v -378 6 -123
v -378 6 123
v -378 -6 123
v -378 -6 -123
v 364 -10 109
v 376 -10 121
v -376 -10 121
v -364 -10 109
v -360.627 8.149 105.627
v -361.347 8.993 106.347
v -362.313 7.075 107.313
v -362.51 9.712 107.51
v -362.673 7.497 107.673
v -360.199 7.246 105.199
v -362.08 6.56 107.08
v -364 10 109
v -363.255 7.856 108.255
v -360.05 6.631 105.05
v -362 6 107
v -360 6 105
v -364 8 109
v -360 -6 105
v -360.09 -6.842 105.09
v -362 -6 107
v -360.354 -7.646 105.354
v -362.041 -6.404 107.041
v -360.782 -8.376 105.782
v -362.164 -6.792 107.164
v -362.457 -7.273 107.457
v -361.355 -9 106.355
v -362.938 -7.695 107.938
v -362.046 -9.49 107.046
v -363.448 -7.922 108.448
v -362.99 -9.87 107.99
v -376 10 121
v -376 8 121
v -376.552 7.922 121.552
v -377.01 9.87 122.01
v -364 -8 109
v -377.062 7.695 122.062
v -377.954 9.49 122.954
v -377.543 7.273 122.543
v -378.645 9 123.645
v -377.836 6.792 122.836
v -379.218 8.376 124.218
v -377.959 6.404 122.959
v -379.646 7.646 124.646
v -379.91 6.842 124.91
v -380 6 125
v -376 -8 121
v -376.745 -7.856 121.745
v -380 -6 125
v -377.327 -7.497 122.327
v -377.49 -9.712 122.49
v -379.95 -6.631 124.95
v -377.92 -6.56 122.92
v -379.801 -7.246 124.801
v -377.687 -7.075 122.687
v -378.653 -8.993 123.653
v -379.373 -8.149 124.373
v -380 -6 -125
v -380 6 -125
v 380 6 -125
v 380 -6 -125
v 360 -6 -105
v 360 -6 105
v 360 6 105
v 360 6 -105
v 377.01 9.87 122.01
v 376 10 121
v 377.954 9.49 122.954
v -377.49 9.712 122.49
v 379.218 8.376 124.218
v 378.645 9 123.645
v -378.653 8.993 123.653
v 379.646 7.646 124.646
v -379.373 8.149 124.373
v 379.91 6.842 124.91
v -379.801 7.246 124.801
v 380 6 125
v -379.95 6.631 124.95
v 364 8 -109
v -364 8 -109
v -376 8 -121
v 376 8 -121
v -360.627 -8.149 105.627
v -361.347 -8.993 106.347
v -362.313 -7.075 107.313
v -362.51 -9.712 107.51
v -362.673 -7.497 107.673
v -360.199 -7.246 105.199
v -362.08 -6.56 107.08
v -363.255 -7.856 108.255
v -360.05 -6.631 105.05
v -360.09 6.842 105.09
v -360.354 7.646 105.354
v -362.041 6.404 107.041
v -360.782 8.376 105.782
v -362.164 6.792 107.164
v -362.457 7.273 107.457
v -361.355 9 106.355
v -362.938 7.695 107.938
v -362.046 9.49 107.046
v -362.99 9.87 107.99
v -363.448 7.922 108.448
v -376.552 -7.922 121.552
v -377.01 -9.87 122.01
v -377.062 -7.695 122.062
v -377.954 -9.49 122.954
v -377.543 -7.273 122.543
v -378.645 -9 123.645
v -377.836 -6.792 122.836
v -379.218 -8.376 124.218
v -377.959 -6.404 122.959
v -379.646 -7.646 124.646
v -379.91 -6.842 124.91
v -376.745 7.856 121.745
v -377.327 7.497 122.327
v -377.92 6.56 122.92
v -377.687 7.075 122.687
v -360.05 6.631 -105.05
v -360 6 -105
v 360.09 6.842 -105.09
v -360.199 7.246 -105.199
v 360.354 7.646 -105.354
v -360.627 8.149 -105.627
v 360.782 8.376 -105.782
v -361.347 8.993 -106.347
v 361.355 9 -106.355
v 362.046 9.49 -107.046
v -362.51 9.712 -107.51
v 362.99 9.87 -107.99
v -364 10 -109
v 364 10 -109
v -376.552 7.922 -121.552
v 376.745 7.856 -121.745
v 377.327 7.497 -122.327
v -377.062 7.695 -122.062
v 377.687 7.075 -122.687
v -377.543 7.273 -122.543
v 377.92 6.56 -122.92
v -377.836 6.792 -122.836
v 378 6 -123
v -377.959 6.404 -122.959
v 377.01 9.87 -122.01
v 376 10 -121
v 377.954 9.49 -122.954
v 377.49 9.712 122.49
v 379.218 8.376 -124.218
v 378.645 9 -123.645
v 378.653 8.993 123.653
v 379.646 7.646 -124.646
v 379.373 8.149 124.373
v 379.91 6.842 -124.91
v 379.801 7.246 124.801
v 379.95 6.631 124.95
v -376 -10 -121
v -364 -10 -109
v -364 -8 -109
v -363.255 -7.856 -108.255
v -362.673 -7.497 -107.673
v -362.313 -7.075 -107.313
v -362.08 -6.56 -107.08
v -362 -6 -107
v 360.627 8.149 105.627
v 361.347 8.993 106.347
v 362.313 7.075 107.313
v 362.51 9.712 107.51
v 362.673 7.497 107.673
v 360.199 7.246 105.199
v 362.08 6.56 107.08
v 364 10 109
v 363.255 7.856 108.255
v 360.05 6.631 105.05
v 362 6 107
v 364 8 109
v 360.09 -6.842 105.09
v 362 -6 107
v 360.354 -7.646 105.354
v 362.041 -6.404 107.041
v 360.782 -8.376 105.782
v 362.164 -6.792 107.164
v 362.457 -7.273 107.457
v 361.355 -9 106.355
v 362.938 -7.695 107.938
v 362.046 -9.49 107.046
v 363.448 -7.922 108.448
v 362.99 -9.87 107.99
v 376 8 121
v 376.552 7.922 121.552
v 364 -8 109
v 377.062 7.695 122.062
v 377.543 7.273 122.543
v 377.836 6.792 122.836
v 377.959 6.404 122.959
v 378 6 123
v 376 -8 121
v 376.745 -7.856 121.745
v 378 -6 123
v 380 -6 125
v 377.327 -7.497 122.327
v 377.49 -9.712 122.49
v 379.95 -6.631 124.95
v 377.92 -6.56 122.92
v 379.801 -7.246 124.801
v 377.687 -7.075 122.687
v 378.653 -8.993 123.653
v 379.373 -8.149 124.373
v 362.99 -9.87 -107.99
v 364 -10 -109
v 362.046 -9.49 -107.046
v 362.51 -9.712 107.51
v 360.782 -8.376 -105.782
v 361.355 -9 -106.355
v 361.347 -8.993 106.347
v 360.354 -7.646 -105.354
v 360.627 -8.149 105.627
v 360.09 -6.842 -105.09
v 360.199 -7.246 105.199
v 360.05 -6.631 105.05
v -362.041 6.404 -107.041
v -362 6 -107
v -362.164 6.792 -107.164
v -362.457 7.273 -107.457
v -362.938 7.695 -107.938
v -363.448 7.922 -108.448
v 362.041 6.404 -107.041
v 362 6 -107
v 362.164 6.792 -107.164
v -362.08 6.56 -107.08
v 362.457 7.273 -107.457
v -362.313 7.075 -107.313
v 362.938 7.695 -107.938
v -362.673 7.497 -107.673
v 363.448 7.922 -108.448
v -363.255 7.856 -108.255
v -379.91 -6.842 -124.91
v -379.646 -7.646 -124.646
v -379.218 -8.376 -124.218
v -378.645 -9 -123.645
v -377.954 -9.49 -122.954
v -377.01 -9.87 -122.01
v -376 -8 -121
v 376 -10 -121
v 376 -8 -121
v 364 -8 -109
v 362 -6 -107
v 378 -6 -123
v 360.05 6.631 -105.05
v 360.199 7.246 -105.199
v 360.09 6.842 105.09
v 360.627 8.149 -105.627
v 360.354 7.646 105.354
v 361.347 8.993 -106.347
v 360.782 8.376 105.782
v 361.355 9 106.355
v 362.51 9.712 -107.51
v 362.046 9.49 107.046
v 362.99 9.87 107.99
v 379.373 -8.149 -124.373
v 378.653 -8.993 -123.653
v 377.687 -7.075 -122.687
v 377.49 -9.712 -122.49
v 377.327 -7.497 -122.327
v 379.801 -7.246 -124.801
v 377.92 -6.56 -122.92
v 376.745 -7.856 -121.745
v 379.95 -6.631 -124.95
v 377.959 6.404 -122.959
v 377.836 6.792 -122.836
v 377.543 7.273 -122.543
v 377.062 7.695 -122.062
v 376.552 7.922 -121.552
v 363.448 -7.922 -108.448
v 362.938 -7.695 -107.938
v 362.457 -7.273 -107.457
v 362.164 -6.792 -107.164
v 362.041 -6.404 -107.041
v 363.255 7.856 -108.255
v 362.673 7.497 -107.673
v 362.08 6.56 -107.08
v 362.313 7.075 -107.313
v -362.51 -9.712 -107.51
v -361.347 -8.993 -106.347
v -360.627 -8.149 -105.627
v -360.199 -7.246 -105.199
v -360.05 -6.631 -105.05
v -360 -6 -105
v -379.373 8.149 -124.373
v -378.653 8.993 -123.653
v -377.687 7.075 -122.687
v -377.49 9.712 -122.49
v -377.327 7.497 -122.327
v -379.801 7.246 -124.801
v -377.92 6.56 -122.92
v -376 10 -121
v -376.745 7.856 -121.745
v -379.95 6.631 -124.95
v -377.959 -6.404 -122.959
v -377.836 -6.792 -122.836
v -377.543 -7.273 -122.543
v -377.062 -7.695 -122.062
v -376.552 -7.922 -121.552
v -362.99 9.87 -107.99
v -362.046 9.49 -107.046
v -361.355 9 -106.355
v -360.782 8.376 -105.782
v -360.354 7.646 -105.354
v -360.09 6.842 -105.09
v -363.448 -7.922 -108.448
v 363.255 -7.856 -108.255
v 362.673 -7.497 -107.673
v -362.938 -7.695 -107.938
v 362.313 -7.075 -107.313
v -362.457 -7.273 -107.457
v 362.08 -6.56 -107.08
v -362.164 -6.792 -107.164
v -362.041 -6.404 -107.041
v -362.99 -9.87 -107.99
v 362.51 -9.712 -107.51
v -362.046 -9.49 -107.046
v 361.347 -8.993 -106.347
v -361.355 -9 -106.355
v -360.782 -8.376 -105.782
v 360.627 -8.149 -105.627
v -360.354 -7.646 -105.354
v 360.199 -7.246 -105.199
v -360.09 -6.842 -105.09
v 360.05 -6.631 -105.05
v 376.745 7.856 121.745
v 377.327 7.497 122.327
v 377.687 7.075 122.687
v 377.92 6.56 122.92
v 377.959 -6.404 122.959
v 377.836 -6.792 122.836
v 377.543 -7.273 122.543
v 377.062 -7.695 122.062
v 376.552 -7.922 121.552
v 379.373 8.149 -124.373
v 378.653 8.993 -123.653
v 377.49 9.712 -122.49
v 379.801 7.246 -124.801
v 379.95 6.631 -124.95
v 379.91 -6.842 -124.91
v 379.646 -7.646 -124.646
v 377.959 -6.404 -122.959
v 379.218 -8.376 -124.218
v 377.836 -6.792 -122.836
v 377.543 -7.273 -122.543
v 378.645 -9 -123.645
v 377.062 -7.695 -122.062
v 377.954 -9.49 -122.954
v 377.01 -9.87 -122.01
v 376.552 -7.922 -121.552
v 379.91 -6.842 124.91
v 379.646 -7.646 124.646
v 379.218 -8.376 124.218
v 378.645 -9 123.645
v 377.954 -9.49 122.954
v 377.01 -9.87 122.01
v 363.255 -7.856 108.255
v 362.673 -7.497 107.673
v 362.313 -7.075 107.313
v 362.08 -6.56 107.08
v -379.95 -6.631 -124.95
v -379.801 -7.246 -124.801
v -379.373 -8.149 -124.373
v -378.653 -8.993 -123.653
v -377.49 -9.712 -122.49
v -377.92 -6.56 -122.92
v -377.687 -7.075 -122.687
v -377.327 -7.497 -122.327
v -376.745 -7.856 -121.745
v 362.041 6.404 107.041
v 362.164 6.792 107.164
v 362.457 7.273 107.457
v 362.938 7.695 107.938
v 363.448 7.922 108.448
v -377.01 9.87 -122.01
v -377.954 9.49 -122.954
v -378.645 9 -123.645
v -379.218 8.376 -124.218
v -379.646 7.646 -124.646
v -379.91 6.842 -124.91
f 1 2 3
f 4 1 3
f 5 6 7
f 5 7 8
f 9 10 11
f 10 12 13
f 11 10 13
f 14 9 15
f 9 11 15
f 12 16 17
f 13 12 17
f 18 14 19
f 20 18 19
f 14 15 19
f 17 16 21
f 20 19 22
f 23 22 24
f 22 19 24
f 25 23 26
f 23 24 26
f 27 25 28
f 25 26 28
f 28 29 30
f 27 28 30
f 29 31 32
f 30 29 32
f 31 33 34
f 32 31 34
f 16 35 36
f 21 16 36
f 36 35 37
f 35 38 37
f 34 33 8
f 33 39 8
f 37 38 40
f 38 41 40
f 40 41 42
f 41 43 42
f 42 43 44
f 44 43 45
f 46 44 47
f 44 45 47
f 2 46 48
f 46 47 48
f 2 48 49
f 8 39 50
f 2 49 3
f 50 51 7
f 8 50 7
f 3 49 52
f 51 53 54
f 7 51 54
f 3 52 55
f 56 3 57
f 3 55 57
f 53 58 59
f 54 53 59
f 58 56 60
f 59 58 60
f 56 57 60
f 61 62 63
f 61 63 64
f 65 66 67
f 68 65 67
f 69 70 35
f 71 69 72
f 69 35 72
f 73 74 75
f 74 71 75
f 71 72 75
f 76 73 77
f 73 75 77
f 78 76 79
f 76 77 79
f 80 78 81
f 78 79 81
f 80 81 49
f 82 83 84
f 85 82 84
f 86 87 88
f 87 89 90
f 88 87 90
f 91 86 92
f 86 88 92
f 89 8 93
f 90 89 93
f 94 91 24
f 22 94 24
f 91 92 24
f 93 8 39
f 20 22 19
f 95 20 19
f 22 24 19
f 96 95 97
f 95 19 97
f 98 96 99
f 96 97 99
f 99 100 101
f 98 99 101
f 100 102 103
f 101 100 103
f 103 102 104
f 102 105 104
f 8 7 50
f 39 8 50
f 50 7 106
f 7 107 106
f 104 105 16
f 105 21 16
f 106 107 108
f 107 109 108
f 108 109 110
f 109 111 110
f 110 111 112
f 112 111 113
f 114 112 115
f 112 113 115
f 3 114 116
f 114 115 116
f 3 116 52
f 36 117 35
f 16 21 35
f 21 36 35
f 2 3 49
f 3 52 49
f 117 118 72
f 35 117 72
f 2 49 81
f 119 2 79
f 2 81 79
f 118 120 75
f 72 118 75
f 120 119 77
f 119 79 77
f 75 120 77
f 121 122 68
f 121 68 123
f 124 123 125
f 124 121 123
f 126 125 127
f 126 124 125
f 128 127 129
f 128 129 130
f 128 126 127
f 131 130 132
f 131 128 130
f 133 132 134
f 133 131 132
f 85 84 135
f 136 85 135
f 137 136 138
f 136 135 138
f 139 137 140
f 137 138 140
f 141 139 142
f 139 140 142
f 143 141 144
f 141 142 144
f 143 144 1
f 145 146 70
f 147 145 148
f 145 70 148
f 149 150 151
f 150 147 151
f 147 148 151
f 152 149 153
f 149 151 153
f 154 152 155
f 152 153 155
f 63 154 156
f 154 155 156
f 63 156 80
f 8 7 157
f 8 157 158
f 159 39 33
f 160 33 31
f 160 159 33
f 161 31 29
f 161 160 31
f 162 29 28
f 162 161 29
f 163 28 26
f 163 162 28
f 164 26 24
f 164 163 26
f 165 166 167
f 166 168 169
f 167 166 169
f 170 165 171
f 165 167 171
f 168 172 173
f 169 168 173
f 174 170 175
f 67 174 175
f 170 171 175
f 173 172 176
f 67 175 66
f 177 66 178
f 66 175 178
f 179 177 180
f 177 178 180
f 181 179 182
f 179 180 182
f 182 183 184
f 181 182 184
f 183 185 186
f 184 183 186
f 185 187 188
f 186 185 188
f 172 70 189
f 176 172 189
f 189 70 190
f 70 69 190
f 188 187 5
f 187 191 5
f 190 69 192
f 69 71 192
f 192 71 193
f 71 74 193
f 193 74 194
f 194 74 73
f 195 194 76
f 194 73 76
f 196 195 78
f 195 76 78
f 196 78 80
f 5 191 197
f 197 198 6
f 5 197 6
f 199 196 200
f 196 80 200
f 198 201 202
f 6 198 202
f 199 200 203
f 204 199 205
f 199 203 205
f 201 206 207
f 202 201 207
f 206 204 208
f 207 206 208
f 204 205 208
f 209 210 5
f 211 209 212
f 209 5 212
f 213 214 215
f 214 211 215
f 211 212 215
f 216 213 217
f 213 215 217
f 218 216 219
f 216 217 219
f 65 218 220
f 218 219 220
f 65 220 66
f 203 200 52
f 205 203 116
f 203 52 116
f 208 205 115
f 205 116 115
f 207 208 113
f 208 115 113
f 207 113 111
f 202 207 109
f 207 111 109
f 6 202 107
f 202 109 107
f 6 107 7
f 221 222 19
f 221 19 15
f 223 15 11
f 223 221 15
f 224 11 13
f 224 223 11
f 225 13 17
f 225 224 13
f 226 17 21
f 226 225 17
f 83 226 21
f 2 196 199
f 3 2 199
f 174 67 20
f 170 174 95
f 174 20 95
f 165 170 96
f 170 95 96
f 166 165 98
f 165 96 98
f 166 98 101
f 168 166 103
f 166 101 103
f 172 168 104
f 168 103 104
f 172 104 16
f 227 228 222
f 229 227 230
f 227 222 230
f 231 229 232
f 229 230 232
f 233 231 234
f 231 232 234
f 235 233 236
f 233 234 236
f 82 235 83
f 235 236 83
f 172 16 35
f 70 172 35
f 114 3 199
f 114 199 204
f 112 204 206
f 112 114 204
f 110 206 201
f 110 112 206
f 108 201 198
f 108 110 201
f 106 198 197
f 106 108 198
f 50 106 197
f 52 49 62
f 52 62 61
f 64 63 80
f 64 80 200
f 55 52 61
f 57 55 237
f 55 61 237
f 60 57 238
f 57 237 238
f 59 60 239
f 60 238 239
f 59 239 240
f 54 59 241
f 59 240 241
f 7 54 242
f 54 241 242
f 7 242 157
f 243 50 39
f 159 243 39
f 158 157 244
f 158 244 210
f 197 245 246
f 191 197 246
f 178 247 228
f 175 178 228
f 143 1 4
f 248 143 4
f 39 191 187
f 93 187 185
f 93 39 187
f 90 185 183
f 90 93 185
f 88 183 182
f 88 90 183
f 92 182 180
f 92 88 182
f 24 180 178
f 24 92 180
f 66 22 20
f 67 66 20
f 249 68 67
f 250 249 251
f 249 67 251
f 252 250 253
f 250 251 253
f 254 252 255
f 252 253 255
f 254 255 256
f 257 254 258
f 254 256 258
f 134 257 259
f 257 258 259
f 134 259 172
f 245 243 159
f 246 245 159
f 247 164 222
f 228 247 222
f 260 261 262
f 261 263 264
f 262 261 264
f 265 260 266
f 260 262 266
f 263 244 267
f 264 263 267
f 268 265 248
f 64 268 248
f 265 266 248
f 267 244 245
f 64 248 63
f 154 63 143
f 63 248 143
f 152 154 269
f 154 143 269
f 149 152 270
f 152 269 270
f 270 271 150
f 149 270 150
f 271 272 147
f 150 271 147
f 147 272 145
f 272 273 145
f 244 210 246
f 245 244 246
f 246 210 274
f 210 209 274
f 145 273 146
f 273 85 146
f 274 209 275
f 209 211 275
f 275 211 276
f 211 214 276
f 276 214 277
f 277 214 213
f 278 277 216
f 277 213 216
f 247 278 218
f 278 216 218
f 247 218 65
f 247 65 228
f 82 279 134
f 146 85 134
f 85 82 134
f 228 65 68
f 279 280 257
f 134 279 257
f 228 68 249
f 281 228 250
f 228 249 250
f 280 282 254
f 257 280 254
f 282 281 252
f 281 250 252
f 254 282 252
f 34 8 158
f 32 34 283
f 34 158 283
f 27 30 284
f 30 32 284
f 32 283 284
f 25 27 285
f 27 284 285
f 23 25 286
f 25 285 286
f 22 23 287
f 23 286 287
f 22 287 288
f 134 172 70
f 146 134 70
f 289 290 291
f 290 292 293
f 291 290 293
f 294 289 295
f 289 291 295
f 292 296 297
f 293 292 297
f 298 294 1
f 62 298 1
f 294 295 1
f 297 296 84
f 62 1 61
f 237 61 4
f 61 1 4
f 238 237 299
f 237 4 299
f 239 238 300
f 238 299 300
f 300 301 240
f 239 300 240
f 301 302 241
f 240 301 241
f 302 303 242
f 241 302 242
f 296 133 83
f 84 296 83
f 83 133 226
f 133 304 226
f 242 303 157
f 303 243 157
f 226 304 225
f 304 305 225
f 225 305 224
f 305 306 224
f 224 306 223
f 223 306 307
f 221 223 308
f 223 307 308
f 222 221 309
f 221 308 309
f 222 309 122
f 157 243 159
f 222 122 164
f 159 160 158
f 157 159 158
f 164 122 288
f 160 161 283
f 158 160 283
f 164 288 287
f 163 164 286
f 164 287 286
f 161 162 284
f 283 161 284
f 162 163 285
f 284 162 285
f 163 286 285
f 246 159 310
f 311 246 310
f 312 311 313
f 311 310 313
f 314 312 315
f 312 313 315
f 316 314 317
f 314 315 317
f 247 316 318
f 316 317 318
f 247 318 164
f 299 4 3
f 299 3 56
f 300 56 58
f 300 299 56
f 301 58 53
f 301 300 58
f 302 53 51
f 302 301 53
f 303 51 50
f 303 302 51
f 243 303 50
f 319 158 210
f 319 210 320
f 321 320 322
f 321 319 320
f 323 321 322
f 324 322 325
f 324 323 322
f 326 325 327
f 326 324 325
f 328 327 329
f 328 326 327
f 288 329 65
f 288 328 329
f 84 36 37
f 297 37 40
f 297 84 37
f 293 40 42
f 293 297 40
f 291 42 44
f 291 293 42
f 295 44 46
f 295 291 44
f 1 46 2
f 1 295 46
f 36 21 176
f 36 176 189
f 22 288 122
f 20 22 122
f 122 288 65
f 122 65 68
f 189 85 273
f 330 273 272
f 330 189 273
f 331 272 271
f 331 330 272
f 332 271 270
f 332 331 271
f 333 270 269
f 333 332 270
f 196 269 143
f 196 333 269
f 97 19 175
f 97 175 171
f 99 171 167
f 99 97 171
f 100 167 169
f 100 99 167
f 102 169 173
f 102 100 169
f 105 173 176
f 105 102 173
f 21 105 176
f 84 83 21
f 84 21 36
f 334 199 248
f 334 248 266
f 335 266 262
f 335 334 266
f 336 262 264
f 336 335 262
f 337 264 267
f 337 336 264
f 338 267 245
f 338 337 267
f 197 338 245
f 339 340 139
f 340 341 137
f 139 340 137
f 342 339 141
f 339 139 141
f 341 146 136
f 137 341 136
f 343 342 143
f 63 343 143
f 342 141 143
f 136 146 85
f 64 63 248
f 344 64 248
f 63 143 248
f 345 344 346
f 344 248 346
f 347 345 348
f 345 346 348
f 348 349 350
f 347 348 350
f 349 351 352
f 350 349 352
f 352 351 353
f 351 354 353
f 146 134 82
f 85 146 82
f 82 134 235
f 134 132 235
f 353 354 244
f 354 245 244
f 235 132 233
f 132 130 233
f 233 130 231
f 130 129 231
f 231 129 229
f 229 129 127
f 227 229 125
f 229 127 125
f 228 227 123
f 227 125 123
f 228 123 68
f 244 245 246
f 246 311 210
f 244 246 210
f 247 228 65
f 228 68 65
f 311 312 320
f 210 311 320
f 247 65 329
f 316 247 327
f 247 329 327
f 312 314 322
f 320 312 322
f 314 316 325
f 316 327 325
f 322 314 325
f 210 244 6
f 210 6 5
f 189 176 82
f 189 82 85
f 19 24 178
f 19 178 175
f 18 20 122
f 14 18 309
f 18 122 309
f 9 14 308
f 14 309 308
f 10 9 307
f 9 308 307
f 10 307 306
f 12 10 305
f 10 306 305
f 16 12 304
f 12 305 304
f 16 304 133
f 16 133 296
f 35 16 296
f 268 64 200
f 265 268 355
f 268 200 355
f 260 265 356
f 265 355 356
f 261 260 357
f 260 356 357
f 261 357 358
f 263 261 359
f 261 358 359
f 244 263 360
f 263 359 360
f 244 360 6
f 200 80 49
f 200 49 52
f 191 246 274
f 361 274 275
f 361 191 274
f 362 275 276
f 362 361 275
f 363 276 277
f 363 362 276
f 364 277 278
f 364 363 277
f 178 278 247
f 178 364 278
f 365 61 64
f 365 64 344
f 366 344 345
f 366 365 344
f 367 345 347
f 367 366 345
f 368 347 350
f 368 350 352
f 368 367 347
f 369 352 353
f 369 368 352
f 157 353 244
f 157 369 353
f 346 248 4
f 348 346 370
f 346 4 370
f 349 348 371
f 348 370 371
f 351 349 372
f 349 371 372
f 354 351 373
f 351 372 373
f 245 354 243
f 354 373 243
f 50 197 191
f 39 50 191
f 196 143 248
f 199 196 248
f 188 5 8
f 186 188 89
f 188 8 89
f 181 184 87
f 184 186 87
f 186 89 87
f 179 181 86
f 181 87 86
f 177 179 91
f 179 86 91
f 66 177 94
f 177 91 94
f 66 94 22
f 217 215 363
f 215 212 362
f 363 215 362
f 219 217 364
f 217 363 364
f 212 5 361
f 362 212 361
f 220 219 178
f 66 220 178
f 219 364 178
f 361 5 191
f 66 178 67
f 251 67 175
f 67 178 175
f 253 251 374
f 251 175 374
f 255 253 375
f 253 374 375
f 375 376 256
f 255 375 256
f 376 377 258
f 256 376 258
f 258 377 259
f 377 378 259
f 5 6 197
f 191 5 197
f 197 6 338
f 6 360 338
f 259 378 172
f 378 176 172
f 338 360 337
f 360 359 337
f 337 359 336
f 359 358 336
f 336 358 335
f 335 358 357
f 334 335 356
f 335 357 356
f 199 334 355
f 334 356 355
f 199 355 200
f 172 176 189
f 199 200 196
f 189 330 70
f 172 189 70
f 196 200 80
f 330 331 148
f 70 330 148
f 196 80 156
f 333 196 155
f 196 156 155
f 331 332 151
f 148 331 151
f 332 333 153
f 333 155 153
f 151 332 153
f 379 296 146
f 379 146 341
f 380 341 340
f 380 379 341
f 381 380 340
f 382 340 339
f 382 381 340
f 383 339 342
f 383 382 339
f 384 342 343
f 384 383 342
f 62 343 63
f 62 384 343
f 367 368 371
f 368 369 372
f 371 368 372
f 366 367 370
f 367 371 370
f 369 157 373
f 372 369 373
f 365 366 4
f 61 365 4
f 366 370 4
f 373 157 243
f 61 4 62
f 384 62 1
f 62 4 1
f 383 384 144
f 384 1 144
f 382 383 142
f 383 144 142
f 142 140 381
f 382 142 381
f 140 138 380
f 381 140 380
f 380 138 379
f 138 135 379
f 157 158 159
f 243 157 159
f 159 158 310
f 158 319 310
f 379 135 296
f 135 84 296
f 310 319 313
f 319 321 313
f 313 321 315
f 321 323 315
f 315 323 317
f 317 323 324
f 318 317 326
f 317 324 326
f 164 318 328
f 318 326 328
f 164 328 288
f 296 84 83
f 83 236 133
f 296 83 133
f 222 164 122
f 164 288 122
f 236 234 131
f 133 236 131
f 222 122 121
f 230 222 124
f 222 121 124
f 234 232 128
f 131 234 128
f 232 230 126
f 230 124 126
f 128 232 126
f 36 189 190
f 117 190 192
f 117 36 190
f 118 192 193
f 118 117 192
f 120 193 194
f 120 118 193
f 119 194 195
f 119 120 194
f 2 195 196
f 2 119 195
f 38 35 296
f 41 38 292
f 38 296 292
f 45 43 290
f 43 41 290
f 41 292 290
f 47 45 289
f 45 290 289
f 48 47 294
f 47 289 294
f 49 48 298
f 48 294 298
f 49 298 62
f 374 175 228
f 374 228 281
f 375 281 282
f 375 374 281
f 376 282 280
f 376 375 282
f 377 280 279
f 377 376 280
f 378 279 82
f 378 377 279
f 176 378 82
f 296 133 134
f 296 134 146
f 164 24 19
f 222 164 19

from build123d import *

# Parameters (mm, degrees)
SQUARE_TUBE_CONFIGURED_20_X_20_X_2_1_DEPTH      = 785.142135624
SQUARE_TUBE_CONFIGURED_20_X_20_X_2_1_DEPTH_BACK = 25.142135624
SQUARE_TUBE_CONFIGURED_20_X_20_X_2_1_2_DEPTH    = 300.284271247
SQUARE_TUBE_CONFIGURED_20_X_20_X_2_1_3_DEPTH    = 810.284271247
SQUARE_TUBE_CONFIGURED_20_X_20_X_2_1_4_DEPTH    = 300.284271247


with BuildPart() as part:
    # Sketch11 → Square tube - configured 20 X 20 X 2(1) (new, two sides)
    with BuildSketch(Plane(origin=(380, 0, -115), x_dir=(0, 0, 1), z_dir=(-1, 0, 0))) as square_tube_configured_20_x_20_x_2_1_sk:
        with BuildLine():
            Line((-6, -10), (6, -10))
            ThreePointArc((6, -10), (8.828427125, -8.828427125), (10, -6))
            Line((10, -6), (10, 6))
            ThreePointArc((10, 6), (8.828427125, 8.828427125), (6, 10))
            Line((6, 10), (-6, 10))
            ThreePointArc((-6, 10), (-8.828427125, 8.828427125), (-10, 6))
            Line((-10, 6), (-10, -6))
            ThreePointArc((-10, -6), (-8.828427125, -8.828427125), (-6, -10))
        make_face()
        with BuildLine():
            Line((-6, -8), (6, -8))
            ThreePointArc((6, -8), (7.414213562, -7.414213562), (8, -6))
            Line((8, -6), (8, 6))
            ThreePointArc((8, 6), (7.414213562, 7.414213562), (6, 8))
            Line((6, 8), (-6, 8))
            ThreePointArc((-6, 8), (-7.414213562, 7.414213562), (-8, 6))
            Line((-8, 6), (-8, -6))
            ThreePointArc((-8, -6), (-7.414213562, -7.414213562), (-6, -8))
        make_face(mode=Mode.SUBTRACT)
    extrude(amount=SQUARE_TUBE_CONFIGURED_20_X_20_X_2_1_DEPTH)
    extrude(square_tube_configured_20_x_20_x_2_1_sk.sketch, amount=-SQUARE_TUBE_CONFIGURED_20_X_20_X_2_1_DEPTH_BACK)

    # Square tube - configured 20 X 20 X 2(1) m
    split(bisect_by=Plane(origin=(380, 0, -125), x_dir=(0, -1, 0), z_dir=(-0.707106781, 0, -0.707106781)), keep=Keep.TOP)

    # Square tube - configured 20 X 20 X 2 2
    split(bisect_by=Plane(origin=(-380, 0, -125), x_dir=(0, 1, 0), z_dir=(0.707106781, 0, -0.707106781)), keep=Keep.TOP)


with BuildPart() as body_2:
    # Sketch11 on segment 2 (carried to segment 2) → Square tube - configured 20 X 20 X 2_1 2 (new body)
    with BuildSketch(Plane(origin=(-370, 0, -150.142135624), x_dir=(1, 0, 0), z_dir=(0, 0, 1))):
        with BuildLine():
            Line((-6, -10), (6, -10))
            ThreePointArc((6, -10), (8.828427125, -8.828427125), (10, -6))
            Line((10, -6), (10, 6))
            ThreePointArc((10, 6), (8.828427125, 8.828427125), (6, 10))
            Line((6, 10), (-6, 10))
            ThreePointArc((-6, 10), (-8.828427125, 8.828427125), (-10, 6))
            Line((-10, 6), (-10, -6))
            ThreePointArc((-10, -6), (-8.828427125, -8.828427125), (-6, -10))
        make_face()
        with BuildLine():
            Line((-6, -8), (6, -8))
            ThreePointArc((6, -8), (7.414213562, -7.414213562), (8, -6))
            Line((8, -6), (8, 6))
            ThreePointArc((8, 6), (7.414213562, 7.414213562), (6, 8))
            Line((6, 8), (-6, 8))
            ThreePointArc((-6, 8), (-7.414213562, 7.414213562), (-8, 6))
            Line((-8, 6), (-8, -6))
            ThreePointArc((-8, -6), (-7.414213562, -7.414213562), (-6, -8))
        make_face(mode=Mode.SUBTRACT)
    extrude(amount=SQUARE_TUBE_CONFIGURED_20_X_20_X_2_1_2_DEPTH)

    # Square tube - configured 20 X 20 X 2 3
    split(bisect_by=Plane(origin=(-380, 0, 125), x_dir=(0, -1, 0), z_dir=(-0.707106781, 0, -0.707106781)), keep=Keep.TOP)

    # Square tube - configured 20 X 20 X 2 4
    split(bisect_by=Plane(origin=(-380, 0, -125), x_dir=(0, -1, 0), z_dir=(-0.707106781, 0, 0.707106781)), keep=Keep.TOP)


with BuildPart() as body_3:
    # Sketch11 on segment 3 (carried to segment 3) → Square tube - configured 20 X 20 X 2_1 3 (new body)
    with BuildSketch(Plane(origin=(-405.142135624, 0, 115), x_dir=(0, 0, -1), z_dir=(1, 0, 0))):
        with BuildLine():
            Line((-6, -10), (6, -10))
            ThreePointArc((6, -10), (8.828427125, -8.828427125), (10, -6))
            Line((10, -6), (10, 6))
            ThreePointArc((10, 6), (8.828427125, 8.828427125), (6, 10))
            Line((6, 10), (-6, 10))
            ThreePointArc((-6, 10), (-8.828427125, 8.828427125), (-10, 6))
            Line((-10, 6), (-10, -6))
            ThreePointArc((-10, -6), (-8.828427125, -8.828427125), (-6, -10))
        make_face()
        with BuildLine():
            Line((-6, -8), (6, -8))
            ThreePointArc((6, -8), (7.414213562, -7.414213562), (8, -6))
            Line((8, -6), (8, 6))
            ThreePointArc((8, 6), (7.414213562, 7.414213562), (6, 8))
            Line((6, 8), (-6, 8))
            ThreePointArc((-6, 8), (-7.414213562, 7.414213562), (-8, 6))
            Line((-8, 6), (-8, -6))
            ThreePointArc((-8, -6), (-7.414213562, -7.414213562), (-6, -8))
        make_face(mode=Mode.SUBTRACT)
    extrude(amount=SQUARE_TUBE_CONFIGURED_20_X_20_X_2_1_3_DEPTH)

    # Square tube - configured 20 X 20 X 2 5
    split(bisect_by=Plane(origin=(380, 0, 125), x_dir=(0, -1, 0), z_dir=(-0.707106781, 0, 0.707106781)), keep=Keep.TOP)

    # Square tube - configured 20 X 20 X 2 6
    split(bisect_by=Plane(origin=(-380, 0, 125), x_dir=(0, 1, 0), z_dir=(0.707106781, 0, 0.707106781)), keep=Keep.TOP)


with BuildPart() as body_4:
    # Sketch11 on segment 4 (carried to segment 4) → Square tube - configured 20 X 20 X 2_1 4 (new body)
    with BuildSketch(Plane(origin=(370, 0, 150.142135624), x_dir=(-1, 0, 0), z_dir=(0, 0, -1))):
        with BuildLine():
            Line((-6, -10), (6, -10))
            ThreePointArc((6, -10), (8.828427125, -8.828427125), (10, -6))
            Line((10, -6), (10, 6))
            ThreePointArc((10, 6), (8.828427125, 8.828427125), (6, 10))
            Line((6, 10), (-6, 10))
            ThreePointArc((-6, 10), (-8.828427125, 8.828427125), (-10, 6))
            Line((-10, 6), (-10, -6))
            ThreePointArc((-10, -6), (-8.828427125, -8.828427125), (-6, -10))
        make_face()
        with BuildLine():
            Line((-6, -8), (6, -8))
            ThreePointArc((6, -8), (7.414213562, -7.414213562), (8, -6))
            Line((8, -6), (8, 6))
            ThreePointArc((8, 6), (7.414213562, 7.414213562), (6, 8))
            Line((6, 8), (-6, 8))
            ThreePointArc((-6, 8), (-7.414213562, 7.414213562), (-8, 6))
            Line((-8, 6), (-8, -6))
            ThreePointArc((-8, -6), (-7.414213562, -7.414213562), (-6, -8))
        make_face(mode=Mode.SUBTRACT)
    extrude(amount=SQUARE_TUBE_CONFIGURED_20_X_20_X_2_1_4_DEPTH)

    # Square tube - configured 20 X 20 X 2 7
    split(bisect_by=Plane(origin=(380, 0, 125), x_dir=(0, 1, 0), z_dir=(0.707106781, 0, -0.707106781)), keep=Keep.TOP)

    # Square tube - configured 20 X 20 X 2 8
    split(bisect_by=Plane(origin=(380, 0, -125), x_dir=(0, 1, 0), z_dir=(0.707106781, 0, 0.707106781)), keep=Keep.TOP)


solid = Compound([part.part, body_2.part, body_3.part, body_4.part])
